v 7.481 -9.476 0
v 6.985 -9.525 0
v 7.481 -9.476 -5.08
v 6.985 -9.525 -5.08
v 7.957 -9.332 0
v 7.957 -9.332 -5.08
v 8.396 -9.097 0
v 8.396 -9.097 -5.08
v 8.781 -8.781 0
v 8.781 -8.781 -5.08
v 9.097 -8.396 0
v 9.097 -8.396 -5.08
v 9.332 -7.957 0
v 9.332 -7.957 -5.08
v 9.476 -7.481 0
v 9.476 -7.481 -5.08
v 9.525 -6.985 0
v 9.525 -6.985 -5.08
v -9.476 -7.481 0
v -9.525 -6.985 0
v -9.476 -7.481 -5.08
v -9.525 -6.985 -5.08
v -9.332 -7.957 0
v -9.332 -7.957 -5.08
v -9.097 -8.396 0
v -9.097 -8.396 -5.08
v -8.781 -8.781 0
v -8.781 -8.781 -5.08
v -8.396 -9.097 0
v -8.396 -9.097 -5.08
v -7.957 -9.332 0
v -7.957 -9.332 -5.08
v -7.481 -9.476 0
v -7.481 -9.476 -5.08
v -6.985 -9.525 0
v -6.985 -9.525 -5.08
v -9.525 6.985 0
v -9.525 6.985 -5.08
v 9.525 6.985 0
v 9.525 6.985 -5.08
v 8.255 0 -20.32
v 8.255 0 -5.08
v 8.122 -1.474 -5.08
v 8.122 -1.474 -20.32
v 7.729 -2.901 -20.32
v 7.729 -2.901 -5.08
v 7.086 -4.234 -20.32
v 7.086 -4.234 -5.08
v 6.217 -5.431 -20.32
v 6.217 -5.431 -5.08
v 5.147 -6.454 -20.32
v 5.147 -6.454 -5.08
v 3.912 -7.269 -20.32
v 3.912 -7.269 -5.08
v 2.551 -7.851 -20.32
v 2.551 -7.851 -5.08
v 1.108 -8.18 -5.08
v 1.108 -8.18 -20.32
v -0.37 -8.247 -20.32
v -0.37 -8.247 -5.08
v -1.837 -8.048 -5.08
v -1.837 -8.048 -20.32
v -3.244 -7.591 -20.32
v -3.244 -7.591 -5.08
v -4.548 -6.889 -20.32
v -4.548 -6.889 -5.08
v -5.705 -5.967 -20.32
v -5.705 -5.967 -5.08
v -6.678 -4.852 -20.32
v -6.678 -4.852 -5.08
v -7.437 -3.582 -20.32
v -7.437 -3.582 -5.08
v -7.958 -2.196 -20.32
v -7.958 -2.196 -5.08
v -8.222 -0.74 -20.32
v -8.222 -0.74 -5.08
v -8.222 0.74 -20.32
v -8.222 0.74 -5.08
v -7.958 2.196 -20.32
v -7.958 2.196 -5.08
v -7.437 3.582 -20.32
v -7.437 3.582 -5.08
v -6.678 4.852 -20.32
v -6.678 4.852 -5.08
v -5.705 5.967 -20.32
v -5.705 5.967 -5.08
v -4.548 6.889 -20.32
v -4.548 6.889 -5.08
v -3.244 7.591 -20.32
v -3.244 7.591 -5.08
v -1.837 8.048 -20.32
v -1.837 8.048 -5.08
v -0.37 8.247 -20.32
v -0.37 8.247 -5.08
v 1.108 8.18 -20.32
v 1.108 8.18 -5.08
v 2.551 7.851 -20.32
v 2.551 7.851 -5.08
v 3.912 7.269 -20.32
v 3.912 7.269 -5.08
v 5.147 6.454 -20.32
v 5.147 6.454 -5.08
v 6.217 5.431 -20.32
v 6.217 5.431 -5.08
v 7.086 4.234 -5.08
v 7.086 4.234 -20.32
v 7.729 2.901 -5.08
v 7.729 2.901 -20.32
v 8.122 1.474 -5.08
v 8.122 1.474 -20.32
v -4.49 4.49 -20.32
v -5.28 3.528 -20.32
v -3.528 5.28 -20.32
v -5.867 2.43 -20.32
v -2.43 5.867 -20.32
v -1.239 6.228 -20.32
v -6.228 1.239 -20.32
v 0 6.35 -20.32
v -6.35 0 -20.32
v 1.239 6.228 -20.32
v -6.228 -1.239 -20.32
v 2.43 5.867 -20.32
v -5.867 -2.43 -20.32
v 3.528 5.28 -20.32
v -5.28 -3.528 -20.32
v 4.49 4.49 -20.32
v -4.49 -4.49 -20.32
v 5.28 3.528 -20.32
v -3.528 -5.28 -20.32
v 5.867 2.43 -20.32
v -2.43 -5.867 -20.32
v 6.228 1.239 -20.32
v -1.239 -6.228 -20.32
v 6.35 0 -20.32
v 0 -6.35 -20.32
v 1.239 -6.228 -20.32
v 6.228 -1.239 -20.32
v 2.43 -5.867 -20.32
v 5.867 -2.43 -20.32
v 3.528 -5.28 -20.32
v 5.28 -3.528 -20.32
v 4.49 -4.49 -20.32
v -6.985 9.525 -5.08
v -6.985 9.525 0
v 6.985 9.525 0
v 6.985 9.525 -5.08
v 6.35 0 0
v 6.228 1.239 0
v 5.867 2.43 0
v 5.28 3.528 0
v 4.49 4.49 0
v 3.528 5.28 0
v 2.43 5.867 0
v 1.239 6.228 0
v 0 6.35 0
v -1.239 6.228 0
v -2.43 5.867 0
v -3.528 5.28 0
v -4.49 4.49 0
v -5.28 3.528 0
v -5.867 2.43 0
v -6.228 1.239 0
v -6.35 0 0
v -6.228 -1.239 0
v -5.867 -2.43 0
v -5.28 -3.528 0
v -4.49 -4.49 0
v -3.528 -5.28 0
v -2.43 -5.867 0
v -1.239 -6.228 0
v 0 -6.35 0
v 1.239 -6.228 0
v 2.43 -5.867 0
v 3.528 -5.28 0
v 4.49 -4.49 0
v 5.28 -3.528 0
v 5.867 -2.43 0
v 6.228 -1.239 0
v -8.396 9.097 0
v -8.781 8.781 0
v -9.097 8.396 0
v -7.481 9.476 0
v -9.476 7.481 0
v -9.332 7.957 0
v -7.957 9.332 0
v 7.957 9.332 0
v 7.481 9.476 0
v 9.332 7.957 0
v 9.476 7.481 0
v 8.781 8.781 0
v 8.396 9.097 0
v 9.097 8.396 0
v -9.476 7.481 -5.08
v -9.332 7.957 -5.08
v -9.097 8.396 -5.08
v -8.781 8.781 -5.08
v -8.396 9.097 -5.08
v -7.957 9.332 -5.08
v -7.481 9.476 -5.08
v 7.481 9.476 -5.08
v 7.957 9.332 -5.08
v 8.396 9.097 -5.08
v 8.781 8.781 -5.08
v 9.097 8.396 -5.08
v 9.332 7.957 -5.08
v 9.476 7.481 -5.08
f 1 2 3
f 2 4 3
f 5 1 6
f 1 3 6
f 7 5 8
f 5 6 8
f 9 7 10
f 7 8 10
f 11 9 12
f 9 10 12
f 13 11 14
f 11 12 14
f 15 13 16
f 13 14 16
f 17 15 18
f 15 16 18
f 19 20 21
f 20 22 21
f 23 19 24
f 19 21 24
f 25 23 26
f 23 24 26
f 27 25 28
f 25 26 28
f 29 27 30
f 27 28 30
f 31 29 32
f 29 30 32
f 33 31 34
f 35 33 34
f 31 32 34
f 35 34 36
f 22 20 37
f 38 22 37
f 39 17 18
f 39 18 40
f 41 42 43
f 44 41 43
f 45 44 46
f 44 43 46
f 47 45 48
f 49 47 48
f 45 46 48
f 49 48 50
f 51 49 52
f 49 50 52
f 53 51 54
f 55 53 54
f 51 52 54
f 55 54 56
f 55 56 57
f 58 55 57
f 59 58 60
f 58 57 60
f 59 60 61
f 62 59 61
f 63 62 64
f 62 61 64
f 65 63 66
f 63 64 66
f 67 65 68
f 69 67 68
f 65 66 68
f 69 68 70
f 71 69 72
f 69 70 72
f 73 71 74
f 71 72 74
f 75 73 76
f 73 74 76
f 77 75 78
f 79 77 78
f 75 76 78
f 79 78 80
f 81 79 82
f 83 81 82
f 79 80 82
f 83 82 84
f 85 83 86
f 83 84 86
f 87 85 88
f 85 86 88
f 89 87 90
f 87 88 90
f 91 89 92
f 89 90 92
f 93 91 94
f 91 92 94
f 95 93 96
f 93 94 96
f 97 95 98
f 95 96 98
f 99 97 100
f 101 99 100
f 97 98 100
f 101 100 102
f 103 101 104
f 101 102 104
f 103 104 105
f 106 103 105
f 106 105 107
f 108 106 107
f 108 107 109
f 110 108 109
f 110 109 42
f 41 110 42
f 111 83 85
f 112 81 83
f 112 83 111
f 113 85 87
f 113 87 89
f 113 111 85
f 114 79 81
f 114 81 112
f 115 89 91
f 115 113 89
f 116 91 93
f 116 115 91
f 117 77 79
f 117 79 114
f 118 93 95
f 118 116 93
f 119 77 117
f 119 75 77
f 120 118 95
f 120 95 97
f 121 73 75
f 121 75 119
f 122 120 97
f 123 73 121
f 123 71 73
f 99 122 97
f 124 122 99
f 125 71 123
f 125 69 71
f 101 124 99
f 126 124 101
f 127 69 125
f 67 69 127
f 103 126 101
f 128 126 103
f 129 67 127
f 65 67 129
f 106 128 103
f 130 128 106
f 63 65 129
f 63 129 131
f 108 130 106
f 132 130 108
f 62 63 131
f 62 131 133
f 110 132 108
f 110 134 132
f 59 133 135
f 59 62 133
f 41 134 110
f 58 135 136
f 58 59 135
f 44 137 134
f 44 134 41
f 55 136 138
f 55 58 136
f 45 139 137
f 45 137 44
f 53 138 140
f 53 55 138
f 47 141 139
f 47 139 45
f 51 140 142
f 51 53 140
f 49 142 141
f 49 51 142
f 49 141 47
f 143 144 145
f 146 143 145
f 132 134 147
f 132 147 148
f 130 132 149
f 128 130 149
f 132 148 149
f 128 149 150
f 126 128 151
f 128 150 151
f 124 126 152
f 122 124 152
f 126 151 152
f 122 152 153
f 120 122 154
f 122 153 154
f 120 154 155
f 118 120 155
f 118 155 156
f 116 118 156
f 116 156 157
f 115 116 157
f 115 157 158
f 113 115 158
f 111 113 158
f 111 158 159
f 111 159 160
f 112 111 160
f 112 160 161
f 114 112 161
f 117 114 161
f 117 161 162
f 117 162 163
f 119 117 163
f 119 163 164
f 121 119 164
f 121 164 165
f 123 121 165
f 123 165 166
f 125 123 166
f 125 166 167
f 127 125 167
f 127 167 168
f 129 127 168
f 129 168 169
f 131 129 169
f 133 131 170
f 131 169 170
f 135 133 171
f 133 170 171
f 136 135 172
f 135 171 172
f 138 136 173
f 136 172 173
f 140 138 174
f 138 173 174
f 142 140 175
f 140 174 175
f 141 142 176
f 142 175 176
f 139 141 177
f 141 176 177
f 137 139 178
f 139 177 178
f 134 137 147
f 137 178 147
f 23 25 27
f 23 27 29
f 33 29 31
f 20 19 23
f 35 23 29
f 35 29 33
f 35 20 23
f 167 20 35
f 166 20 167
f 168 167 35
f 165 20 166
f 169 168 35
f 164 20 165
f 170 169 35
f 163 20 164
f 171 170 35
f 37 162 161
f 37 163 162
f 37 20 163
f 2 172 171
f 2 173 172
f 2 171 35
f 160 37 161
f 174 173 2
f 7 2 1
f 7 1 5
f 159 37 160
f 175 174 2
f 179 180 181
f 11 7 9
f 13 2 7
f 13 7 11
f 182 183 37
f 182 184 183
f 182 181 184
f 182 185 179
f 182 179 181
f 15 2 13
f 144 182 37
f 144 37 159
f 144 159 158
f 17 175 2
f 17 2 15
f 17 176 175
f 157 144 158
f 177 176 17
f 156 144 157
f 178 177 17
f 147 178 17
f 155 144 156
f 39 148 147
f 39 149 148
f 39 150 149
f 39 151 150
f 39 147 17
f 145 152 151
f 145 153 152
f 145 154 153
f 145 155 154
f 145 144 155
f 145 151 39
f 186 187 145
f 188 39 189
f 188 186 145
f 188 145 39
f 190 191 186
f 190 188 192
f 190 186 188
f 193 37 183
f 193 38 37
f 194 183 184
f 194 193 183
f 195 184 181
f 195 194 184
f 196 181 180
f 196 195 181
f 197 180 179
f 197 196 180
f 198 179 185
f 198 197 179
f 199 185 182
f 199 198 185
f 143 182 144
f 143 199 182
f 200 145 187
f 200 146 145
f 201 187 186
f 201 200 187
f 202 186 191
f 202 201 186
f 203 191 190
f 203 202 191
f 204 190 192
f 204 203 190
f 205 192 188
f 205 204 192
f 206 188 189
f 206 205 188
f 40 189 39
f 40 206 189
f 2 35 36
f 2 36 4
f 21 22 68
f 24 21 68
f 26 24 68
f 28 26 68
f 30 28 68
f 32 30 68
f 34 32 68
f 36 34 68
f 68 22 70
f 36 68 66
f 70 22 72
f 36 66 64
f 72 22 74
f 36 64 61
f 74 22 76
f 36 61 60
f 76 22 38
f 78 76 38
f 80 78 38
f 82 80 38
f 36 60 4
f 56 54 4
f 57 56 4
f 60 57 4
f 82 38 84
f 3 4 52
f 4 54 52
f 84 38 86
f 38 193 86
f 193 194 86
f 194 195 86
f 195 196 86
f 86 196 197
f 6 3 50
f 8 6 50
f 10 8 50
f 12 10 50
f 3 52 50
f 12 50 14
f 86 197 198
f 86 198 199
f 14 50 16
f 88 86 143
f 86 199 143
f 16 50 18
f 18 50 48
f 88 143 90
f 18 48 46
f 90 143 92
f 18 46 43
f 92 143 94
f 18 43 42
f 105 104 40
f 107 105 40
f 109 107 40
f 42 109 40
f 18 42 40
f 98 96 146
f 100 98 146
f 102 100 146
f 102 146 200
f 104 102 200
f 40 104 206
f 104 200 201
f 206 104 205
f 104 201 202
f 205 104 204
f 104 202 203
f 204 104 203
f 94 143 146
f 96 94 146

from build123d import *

# Parameters (mm, degrees)
SKETCH1_W           = 19.05
SKETCH1_H           = 19.05
BOSS_EXTRUDE1_DEPTH = 5.08
SKETCH2_R           = 8.255
BOSS_EXTRUDE2_DEPTH = 15.24
SKETCH3_R           = 6.35
CUT_EXTRUDE1_DEPTH  = 25.379369352
FILLET1_R           = 2.54


with BuildPart() as part:
    # Sketch1 → Boss-Extrude1 (new body)
    with BuildSketch(Plane.XY):
        Rectangle(SKETCH1_W, SKETCH1_H)
    extrude(amount=-BOSS_EXTRUDE1_DEPTH)

    # Sketch2 → Boss-Extrude2 (add)
    with BuildSketch(Plane(origin=(0, 0, -5.08), x_dir=(-1, 0, 0), z_dir=(0, 0, -1))):
        with Locations(Location((0, 0, 0), (0, 0, 180))):
            Circle(SKETCH2_R)
    extrude(amount=BOSS_EXTRUDE2_DEPTH)

    # Sketch3 → Cut-Extrude1 (cut, through all)
    with BuildSketch(Plane.XY):
        Circle(SKETCH3_R)
    extrude(amount=-CUT_EXTRUDE1_DEPTH, mode=Mode.SUBTRACT)

    # Fillet1
    fillet1_edges = [part.edges().sort_by_distance(p)[0] for p in [
        (9.525, -9.525, -2.54),
        (-9.525, -9.525, -2.54),
        (-9.525, 9.525, -2.54),
        (9.525, 9.525, -2.54),
    ]]
    fillet(fillet1_edges, radius=FILLET1_R)


solid = part.part
